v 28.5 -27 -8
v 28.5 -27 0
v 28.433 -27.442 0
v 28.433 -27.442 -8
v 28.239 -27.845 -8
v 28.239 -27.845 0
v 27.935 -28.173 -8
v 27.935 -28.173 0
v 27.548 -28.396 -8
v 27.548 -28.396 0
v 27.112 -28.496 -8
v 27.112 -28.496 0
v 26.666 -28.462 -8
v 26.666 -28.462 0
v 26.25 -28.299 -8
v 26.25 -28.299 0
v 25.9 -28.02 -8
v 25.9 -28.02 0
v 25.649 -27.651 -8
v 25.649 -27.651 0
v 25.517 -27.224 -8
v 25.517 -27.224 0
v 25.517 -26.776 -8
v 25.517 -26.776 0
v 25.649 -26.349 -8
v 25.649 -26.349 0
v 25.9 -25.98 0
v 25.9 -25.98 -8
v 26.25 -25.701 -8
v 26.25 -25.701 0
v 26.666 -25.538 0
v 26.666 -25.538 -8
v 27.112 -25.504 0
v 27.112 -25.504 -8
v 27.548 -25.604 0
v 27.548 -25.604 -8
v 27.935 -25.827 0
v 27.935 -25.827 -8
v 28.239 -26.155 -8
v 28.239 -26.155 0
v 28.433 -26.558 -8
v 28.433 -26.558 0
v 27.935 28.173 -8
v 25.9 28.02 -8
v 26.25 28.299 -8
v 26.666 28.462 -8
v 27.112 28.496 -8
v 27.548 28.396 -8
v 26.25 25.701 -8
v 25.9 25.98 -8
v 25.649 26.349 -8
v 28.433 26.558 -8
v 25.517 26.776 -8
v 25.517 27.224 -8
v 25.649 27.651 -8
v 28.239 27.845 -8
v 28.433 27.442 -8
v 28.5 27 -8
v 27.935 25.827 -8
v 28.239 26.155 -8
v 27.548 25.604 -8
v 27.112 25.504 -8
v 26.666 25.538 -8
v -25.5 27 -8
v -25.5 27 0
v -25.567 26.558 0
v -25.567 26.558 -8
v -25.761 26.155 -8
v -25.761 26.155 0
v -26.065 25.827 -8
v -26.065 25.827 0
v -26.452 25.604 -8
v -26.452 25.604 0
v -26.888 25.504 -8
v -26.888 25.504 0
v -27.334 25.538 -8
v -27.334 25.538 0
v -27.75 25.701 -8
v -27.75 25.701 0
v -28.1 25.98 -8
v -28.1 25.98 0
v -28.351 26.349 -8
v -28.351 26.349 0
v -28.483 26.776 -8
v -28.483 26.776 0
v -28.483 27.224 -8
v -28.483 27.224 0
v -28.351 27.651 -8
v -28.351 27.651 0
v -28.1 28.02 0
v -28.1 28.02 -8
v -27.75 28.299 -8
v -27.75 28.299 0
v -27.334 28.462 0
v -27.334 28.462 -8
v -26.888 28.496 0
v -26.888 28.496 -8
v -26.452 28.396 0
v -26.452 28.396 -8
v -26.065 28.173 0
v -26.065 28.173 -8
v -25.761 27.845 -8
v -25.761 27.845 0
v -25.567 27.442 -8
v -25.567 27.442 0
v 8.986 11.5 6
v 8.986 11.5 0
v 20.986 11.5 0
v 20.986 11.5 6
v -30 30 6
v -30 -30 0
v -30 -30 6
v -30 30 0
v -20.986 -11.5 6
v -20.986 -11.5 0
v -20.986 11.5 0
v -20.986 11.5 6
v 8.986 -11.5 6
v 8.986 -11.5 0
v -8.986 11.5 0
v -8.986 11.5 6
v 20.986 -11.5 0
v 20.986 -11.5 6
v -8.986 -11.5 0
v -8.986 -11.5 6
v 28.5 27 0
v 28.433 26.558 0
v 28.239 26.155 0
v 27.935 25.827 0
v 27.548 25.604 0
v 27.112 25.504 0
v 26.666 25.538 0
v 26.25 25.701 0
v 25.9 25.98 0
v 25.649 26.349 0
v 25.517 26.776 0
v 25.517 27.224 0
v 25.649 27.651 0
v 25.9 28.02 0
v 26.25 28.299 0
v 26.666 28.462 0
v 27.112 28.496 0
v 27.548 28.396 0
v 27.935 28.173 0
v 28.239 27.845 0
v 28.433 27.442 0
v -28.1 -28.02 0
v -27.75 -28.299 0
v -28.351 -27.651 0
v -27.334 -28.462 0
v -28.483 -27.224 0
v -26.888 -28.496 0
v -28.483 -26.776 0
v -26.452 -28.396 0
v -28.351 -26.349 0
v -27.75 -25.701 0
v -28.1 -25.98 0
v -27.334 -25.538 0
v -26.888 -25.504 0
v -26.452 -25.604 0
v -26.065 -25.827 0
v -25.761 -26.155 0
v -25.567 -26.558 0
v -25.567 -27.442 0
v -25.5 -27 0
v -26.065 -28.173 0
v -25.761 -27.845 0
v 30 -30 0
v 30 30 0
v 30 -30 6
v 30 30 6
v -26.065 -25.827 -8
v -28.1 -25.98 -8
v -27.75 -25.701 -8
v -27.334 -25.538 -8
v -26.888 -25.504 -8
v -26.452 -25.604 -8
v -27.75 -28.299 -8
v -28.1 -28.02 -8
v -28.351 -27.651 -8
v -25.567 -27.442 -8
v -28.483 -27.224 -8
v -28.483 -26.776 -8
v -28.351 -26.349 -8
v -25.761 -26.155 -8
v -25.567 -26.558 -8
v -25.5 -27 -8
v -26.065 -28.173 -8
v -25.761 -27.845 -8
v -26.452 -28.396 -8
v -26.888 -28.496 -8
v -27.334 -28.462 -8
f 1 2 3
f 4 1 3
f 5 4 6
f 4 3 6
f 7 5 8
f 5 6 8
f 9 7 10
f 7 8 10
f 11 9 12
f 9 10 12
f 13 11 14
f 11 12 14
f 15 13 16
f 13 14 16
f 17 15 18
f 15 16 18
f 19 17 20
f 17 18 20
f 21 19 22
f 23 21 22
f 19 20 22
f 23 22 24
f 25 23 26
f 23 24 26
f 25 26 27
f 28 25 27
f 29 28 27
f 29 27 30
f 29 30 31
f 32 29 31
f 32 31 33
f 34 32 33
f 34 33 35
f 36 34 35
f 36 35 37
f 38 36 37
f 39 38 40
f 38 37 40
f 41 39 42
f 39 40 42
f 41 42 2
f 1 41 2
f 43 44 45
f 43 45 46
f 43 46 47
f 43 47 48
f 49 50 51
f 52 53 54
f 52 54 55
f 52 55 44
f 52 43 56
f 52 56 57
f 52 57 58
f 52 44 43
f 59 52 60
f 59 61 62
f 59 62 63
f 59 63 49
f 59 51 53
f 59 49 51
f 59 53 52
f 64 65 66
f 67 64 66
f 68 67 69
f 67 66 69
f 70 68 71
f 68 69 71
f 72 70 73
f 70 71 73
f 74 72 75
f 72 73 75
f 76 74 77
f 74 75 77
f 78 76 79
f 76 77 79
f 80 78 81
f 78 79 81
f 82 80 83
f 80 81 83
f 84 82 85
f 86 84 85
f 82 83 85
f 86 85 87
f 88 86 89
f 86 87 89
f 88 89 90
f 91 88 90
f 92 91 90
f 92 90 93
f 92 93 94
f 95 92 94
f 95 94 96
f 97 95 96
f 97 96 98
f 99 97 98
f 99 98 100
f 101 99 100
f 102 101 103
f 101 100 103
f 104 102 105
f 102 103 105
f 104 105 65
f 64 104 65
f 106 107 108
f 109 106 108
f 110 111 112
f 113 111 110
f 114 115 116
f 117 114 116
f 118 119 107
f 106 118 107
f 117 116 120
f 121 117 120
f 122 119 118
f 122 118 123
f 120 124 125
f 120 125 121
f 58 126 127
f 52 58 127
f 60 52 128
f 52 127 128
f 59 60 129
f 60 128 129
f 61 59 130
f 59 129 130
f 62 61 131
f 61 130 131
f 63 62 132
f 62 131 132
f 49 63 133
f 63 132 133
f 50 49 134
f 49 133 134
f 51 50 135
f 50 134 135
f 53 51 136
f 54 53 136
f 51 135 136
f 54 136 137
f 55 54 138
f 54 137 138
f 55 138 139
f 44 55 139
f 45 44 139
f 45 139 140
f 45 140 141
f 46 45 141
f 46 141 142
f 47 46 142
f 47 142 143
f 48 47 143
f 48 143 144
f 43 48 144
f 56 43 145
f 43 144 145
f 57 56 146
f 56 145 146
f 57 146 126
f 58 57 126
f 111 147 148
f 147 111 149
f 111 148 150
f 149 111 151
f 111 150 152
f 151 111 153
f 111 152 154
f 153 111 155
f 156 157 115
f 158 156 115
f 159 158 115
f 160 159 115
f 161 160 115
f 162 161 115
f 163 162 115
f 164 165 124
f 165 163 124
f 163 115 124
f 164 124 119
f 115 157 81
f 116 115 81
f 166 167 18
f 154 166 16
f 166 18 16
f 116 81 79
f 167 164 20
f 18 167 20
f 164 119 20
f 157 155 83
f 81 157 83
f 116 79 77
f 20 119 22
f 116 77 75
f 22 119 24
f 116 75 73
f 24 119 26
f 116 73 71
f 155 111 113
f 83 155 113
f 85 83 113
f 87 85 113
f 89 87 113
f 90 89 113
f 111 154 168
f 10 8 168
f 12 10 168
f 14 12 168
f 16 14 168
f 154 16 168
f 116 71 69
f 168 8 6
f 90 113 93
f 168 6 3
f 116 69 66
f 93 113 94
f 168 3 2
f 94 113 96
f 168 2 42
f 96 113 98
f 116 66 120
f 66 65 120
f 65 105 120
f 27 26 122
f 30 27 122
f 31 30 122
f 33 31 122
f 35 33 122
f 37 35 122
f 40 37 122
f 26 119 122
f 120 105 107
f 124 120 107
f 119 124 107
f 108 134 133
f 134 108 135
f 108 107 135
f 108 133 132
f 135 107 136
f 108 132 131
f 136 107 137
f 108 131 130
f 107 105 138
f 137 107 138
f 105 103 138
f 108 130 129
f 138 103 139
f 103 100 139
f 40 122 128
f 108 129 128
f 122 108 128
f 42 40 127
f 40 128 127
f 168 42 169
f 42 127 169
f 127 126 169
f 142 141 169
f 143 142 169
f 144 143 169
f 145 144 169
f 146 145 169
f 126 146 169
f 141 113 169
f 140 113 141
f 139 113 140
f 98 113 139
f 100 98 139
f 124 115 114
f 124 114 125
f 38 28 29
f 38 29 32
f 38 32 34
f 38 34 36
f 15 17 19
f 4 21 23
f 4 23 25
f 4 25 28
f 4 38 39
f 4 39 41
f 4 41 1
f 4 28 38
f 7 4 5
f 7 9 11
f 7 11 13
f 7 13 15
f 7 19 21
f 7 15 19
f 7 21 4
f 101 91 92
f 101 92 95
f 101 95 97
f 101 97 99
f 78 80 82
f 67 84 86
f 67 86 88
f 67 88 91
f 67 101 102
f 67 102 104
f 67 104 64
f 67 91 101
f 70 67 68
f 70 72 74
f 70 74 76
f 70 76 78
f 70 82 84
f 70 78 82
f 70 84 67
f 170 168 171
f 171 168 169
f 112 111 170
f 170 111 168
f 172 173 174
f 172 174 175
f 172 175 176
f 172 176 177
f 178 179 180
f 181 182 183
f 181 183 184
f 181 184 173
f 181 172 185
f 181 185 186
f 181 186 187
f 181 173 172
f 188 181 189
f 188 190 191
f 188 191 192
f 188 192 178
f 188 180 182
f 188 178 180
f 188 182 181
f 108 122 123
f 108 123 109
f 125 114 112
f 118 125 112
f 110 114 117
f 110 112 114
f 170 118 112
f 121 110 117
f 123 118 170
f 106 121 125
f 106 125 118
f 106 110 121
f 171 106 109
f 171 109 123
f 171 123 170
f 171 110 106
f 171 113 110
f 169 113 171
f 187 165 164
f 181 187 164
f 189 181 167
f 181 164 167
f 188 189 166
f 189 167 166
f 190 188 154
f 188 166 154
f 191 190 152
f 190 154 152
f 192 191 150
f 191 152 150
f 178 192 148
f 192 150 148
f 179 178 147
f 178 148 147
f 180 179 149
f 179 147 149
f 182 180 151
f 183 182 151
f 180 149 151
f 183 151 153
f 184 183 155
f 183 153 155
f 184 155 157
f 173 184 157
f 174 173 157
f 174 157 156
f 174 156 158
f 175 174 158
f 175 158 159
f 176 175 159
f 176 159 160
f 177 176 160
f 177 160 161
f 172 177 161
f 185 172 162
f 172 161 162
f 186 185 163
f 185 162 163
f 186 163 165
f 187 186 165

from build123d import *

# Parameters (mm, degrees)
F0_W     = 60
F0_H     = 60
F0_W_2   = 12
F0_H_2   = 23
F1_DEPTH = 6
F2_R     = 1.5
F3_DEPTH = 8


with BuildPart() as f1:
    # F0 (on Top) → F1 (new body)
    with BuildSketch(Plane.XY):
        Rectangle(F0_W, F0_H)
        with Locations((-14.985624, 0)):
            Rectangle(F0_W_2, F0_H_2, mode=Mode.SUBTRACT)
        with Locations((14.985624, 0)):
            Rectangle(F0_W_2, F0_H_2, mode=Mode.SUBTRACT)
    extrude(amount=F1_DEPTH)

    # F2 (on face) → F3 (join)
    with BuildSketch(Plane(origin=(0, 0, 0), x_dir=(1, 0, 0), z_dir=(0, 0, -1))):
        with Locations((-27, 27)):
            Circle(F2_R)
        with Locations((27, 27)):
            Circle(F2_R)
        with Locations((27, -27)):
            Circle(F2_R)
        with Locations((-27, -27)):
            Circle(F2_R)
    extrude(amount=F3_DEPTH)


solid = f1.part
